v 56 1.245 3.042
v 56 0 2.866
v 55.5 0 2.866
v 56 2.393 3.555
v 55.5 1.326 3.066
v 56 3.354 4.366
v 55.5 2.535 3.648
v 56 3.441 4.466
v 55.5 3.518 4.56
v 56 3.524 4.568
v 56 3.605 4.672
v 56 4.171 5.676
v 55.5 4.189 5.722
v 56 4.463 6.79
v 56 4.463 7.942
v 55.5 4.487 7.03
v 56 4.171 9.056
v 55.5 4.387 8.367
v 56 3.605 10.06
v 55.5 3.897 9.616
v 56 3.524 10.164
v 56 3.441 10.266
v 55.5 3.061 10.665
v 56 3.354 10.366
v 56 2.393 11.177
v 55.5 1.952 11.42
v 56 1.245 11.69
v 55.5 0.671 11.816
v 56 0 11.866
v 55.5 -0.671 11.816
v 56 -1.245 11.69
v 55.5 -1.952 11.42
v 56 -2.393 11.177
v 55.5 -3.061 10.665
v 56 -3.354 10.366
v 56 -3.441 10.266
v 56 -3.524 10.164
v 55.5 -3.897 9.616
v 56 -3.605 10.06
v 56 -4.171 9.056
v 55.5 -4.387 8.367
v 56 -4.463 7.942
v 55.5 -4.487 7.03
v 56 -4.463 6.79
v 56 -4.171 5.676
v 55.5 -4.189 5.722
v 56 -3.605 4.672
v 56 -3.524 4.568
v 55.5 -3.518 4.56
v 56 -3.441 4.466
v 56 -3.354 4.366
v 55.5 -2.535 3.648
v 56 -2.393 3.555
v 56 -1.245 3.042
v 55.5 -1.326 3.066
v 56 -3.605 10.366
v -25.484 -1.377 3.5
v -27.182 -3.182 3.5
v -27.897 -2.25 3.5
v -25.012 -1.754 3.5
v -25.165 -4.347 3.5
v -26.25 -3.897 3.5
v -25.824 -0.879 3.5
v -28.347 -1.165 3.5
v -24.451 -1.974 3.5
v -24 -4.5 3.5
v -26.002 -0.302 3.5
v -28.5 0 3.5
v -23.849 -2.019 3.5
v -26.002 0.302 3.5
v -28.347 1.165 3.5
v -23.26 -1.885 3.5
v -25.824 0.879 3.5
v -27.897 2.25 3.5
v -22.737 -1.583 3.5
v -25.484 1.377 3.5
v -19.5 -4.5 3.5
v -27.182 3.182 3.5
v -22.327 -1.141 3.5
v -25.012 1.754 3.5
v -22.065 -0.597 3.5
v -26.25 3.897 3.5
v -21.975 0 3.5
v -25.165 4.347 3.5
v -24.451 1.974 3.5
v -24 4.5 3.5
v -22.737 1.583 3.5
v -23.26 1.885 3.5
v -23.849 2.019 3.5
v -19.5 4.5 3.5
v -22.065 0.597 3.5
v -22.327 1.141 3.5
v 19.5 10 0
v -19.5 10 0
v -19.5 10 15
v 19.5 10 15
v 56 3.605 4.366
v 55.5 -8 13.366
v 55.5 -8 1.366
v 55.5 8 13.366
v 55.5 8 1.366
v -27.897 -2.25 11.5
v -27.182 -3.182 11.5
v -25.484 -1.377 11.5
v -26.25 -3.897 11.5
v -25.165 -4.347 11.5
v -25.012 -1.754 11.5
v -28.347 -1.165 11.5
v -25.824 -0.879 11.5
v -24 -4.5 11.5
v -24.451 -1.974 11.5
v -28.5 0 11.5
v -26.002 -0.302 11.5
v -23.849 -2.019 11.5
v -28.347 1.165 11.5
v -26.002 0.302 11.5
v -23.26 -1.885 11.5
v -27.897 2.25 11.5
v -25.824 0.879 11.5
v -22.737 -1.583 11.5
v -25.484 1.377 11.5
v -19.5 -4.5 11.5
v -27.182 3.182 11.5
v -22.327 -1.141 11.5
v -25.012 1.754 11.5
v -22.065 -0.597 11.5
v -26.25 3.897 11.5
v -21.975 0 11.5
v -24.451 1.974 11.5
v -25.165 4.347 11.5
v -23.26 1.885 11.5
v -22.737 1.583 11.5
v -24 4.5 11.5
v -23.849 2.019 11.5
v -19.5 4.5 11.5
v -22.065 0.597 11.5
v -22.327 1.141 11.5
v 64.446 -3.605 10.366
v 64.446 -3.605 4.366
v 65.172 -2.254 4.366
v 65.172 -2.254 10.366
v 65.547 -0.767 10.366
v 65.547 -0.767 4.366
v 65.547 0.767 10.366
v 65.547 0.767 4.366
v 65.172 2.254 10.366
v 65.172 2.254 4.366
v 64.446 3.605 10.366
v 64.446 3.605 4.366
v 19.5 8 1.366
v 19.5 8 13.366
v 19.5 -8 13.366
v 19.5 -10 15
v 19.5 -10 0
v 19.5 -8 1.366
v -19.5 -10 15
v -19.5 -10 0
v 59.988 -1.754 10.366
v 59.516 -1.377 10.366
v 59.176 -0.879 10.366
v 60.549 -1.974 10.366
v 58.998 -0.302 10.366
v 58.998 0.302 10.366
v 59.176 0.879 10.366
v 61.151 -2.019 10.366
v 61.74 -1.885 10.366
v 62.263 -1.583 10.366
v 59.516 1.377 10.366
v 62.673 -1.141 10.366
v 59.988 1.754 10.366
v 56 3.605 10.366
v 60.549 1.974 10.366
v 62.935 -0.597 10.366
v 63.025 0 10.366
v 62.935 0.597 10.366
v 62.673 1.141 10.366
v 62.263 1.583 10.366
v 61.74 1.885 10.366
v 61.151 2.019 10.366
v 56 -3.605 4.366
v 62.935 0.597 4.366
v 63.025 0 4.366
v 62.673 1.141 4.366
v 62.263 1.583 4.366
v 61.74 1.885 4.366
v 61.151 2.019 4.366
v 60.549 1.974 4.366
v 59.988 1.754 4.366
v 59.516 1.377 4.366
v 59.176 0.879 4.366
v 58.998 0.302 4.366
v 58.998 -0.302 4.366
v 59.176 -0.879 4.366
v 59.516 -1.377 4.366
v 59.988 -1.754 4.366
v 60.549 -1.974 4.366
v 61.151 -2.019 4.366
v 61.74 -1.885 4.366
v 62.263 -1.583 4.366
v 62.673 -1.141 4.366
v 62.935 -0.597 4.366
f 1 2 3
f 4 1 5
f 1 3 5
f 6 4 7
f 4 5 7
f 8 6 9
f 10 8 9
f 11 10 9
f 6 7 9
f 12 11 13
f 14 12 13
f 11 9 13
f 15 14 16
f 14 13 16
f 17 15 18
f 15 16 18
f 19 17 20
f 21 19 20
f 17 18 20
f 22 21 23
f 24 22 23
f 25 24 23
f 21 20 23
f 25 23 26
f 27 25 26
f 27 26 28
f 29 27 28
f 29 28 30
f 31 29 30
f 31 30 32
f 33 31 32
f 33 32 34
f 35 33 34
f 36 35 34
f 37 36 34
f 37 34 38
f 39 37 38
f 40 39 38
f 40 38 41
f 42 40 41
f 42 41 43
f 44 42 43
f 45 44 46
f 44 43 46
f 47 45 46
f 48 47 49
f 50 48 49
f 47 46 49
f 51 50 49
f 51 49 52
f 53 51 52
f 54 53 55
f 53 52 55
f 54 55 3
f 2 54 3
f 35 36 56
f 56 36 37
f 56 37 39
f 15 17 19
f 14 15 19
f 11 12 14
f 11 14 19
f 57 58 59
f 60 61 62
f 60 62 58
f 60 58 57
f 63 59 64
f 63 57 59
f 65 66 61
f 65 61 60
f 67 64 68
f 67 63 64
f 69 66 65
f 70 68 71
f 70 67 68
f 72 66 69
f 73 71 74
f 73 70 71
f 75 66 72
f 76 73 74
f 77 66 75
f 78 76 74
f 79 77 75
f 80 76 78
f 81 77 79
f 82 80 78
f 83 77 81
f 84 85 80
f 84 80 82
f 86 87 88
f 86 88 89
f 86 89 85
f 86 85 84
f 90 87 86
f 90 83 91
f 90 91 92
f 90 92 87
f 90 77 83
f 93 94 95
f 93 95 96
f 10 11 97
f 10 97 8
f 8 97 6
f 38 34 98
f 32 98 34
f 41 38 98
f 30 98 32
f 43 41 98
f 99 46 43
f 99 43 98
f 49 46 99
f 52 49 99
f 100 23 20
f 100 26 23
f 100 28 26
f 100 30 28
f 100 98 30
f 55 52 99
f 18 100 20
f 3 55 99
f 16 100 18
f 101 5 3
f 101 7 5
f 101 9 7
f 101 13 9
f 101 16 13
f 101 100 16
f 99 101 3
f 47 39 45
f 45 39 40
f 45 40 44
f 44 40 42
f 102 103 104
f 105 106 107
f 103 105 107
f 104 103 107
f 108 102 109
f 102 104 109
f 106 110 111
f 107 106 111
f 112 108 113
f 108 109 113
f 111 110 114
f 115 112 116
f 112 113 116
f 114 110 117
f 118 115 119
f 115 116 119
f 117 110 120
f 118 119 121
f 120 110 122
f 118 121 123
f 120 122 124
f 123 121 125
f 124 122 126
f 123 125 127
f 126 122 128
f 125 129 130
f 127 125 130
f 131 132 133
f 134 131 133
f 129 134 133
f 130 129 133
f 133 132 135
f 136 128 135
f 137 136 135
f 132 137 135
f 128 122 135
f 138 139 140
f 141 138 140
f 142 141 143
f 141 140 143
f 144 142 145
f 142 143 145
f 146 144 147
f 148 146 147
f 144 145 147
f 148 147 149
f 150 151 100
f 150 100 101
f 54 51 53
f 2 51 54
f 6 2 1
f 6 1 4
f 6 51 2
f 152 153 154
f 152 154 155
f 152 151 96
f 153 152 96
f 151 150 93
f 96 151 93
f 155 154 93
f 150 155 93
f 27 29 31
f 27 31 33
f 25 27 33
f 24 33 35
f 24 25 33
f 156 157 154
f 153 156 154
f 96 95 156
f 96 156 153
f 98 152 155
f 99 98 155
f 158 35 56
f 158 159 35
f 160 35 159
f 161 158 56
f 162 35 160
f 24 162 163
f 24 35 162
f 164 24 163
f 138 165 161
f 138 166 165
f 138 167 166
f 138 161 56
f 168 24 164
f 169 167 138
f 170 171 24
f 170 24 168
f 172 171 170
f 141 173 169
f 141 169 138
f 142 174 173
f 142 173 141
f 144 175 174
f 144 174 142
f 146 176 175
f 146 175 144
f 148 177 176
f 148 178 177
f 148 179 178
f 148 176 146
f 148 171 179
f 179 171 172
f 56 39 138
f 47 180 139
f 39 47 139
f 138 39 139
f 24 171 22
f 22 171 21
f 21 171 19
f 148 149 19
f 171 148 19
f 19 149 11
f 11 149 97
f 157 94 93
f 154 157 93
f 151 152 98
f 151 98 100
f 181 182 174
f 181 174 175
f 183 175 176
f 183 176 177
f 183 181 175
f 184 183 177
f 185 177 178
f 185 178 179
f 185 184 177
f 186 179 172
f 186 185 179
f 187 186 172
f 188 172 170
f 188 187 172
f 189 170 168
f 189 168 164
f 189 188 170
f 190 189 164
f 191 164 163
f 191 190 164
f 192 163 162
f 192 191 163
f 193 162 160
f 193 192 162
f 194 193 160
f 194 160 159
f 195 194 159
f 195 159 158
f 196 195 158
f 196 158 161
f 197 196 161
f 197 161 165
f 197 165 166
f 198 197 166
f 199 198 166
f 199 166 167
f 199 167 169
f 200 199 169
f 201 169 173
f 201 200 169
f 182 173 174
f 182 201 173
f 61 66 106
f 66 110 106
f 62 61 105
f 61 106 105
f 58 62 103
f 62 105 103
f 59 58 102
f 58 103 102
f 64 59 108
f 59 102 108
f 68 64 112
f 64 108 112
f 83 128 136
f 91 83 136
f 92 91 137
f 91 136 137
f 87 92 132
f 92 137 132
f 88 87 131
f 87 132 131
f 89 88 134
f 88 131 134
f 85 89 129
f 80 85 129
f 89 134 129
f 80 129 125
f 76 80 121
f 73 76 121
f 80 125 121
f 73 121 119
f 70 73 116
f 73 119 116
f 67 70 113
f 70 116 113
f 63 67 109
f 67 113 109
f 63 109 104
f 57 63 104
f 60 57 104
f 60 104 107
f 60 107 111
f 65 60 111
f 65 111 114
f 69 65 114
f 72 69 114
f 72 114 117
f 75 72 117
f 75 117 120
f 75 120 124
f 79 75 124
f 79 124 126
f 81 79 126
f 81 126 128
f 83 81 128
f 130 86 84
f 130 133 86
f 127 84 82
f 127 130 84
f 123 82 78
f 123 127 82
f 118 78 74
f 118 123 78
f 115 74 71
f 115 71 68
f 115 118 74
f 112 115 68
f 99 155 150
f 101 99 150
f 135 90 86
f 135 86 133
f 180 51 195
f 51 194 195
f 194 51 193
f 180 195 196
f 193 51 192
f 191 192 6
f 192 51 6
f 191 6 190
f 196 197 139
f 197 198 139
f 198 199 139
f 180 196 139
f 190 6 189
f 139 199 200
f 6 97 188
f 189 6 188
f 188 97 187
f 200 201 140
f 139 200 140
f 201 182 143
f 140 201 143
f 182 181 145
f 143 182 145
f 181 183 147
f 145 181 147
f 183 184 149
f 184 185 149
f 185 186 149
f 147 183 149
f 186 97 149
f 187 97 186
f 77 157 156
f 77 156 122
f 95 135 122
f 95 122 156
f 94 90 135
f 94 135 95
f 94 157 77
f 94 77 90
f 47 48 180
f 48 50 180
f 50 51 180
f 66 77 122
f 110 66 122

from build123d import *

# Parameters (mm, degrees)
SKETCH_1_W           = 39
SKETCH_1_H           = 20
EXTRUDE_1_DEPTH      = 15
SKETCH_2_W           = 8
SKETCH_2_H           = 9
EXTRUDE_2_DEPTH      = 9
SKETCH_3_R           = 2.025
CUT_EXTRUDE_1_DEPTH  = 10
FILLET_1_R           = 4.5
SKETCH_4_W           = 12
SKETCH_4_H           = 16
EXTRUDE_3_DEPTH      = 36
SKETCH_5_R           = 4.5
EXTRUDE_4_DEPTH      = 0.5
EXTRUDE_5_DEPTH      = 3
EXTRUDE_5_DEPTH_BACK = 3
SKETCH_7_R           = 2.025


with BuildPart() as part:
    # 스케치1 → 보스-돌출1 (new body)
    with BuildSketch(Plane.XY):
        Rectangle(SKETCH_1_W, SKETCH_1_H)
    extrude(amount=EXTRUDE_1_DEPTH)

    # 스케치2 → 보스-돌출2 (add)
    with BuildSketch(Plane.ZY.offset(19.5)):
        with Locations((7.5, 0)):
            Rectangle(SKETCH_2_W, SKETCH_2_H)
    extrude(amount=EXTRUDE_2_DEPTH)

    # 스케치3 → 컷-돌출1 (cut)
    with BuildSketch(Plane.XY.offset(11.5)):
        with Locations((-24, 0)):
            Circle(SKETCH_3_R)
    extrude(amount=-CUT_EXTRUDE_1_DEPTH, mode=Mode.SUBTRACT)

    # 필렛1
    fillet_1_edges = [part.edges().sort_by_distance(p)[0] for p in [
        (-28.5, -4.5, 7.5),
        (-28.5, 4.5, 7.5),
    ]]
    fillet(fillet_1_edges, radius=FILLET_1_R - 0.0001)  # a hair under: the kernel refuses the full size

    # 스케치4 → 보스-돌출3 (add)
    with BuildSketch(Plane(origin=(19.5, 0, 0), x_dir=(0, 0, -1), z_dir=(1, 0, 0))):
        with Locations((-7.366003783, 0)):
            Rectangle(SKETCH_4_W, SKETCH_4_H)
    extrude(amount=EXTRUDE_3_DEPTH)

    # 스케치5 → 보스-돌출4 (add)
    with BuildSketch(Plane(origin=(55.5, 0, 0), x_dir=(0, 0, -1), z_dir=(1, 0, 0))):
        with Locations((-7.366003783, 0)):
            Circle(SKETCH_5_R)
    extrude(amount=EXTRUDE_4_DEPTH)

    # 스케치7 → 보스-돌출5 (add, two sides: drawn at the far end of the back side and taken through both)
    with BuildSketch(Plane.XY.offset(7.366003783).offset(-EXTRUDE_5_DEPTH_BACK)):
        with BuildLine():
            Line((56, -3.604783634), (64.44555705, -3.604783634))
            ThreePointArc((64.44555705, -3.604783634), (65.594419255, 0), (64.44555705, 3.604783634))
            Line((64.44555705, 3.604783634), (56, 3.604783634))
            Line((56, 3.604783634), (56, -3.604783634))
        make_face()
        with Locations((61, 0)):
            Circle(SKETCH_7_R, mode=Mode.SUBTRACT)
    extrude(amount=EXTRUDE_5_DEPTH + EXTRUDE_5_DEPTH_BACK)


solid = part.part
